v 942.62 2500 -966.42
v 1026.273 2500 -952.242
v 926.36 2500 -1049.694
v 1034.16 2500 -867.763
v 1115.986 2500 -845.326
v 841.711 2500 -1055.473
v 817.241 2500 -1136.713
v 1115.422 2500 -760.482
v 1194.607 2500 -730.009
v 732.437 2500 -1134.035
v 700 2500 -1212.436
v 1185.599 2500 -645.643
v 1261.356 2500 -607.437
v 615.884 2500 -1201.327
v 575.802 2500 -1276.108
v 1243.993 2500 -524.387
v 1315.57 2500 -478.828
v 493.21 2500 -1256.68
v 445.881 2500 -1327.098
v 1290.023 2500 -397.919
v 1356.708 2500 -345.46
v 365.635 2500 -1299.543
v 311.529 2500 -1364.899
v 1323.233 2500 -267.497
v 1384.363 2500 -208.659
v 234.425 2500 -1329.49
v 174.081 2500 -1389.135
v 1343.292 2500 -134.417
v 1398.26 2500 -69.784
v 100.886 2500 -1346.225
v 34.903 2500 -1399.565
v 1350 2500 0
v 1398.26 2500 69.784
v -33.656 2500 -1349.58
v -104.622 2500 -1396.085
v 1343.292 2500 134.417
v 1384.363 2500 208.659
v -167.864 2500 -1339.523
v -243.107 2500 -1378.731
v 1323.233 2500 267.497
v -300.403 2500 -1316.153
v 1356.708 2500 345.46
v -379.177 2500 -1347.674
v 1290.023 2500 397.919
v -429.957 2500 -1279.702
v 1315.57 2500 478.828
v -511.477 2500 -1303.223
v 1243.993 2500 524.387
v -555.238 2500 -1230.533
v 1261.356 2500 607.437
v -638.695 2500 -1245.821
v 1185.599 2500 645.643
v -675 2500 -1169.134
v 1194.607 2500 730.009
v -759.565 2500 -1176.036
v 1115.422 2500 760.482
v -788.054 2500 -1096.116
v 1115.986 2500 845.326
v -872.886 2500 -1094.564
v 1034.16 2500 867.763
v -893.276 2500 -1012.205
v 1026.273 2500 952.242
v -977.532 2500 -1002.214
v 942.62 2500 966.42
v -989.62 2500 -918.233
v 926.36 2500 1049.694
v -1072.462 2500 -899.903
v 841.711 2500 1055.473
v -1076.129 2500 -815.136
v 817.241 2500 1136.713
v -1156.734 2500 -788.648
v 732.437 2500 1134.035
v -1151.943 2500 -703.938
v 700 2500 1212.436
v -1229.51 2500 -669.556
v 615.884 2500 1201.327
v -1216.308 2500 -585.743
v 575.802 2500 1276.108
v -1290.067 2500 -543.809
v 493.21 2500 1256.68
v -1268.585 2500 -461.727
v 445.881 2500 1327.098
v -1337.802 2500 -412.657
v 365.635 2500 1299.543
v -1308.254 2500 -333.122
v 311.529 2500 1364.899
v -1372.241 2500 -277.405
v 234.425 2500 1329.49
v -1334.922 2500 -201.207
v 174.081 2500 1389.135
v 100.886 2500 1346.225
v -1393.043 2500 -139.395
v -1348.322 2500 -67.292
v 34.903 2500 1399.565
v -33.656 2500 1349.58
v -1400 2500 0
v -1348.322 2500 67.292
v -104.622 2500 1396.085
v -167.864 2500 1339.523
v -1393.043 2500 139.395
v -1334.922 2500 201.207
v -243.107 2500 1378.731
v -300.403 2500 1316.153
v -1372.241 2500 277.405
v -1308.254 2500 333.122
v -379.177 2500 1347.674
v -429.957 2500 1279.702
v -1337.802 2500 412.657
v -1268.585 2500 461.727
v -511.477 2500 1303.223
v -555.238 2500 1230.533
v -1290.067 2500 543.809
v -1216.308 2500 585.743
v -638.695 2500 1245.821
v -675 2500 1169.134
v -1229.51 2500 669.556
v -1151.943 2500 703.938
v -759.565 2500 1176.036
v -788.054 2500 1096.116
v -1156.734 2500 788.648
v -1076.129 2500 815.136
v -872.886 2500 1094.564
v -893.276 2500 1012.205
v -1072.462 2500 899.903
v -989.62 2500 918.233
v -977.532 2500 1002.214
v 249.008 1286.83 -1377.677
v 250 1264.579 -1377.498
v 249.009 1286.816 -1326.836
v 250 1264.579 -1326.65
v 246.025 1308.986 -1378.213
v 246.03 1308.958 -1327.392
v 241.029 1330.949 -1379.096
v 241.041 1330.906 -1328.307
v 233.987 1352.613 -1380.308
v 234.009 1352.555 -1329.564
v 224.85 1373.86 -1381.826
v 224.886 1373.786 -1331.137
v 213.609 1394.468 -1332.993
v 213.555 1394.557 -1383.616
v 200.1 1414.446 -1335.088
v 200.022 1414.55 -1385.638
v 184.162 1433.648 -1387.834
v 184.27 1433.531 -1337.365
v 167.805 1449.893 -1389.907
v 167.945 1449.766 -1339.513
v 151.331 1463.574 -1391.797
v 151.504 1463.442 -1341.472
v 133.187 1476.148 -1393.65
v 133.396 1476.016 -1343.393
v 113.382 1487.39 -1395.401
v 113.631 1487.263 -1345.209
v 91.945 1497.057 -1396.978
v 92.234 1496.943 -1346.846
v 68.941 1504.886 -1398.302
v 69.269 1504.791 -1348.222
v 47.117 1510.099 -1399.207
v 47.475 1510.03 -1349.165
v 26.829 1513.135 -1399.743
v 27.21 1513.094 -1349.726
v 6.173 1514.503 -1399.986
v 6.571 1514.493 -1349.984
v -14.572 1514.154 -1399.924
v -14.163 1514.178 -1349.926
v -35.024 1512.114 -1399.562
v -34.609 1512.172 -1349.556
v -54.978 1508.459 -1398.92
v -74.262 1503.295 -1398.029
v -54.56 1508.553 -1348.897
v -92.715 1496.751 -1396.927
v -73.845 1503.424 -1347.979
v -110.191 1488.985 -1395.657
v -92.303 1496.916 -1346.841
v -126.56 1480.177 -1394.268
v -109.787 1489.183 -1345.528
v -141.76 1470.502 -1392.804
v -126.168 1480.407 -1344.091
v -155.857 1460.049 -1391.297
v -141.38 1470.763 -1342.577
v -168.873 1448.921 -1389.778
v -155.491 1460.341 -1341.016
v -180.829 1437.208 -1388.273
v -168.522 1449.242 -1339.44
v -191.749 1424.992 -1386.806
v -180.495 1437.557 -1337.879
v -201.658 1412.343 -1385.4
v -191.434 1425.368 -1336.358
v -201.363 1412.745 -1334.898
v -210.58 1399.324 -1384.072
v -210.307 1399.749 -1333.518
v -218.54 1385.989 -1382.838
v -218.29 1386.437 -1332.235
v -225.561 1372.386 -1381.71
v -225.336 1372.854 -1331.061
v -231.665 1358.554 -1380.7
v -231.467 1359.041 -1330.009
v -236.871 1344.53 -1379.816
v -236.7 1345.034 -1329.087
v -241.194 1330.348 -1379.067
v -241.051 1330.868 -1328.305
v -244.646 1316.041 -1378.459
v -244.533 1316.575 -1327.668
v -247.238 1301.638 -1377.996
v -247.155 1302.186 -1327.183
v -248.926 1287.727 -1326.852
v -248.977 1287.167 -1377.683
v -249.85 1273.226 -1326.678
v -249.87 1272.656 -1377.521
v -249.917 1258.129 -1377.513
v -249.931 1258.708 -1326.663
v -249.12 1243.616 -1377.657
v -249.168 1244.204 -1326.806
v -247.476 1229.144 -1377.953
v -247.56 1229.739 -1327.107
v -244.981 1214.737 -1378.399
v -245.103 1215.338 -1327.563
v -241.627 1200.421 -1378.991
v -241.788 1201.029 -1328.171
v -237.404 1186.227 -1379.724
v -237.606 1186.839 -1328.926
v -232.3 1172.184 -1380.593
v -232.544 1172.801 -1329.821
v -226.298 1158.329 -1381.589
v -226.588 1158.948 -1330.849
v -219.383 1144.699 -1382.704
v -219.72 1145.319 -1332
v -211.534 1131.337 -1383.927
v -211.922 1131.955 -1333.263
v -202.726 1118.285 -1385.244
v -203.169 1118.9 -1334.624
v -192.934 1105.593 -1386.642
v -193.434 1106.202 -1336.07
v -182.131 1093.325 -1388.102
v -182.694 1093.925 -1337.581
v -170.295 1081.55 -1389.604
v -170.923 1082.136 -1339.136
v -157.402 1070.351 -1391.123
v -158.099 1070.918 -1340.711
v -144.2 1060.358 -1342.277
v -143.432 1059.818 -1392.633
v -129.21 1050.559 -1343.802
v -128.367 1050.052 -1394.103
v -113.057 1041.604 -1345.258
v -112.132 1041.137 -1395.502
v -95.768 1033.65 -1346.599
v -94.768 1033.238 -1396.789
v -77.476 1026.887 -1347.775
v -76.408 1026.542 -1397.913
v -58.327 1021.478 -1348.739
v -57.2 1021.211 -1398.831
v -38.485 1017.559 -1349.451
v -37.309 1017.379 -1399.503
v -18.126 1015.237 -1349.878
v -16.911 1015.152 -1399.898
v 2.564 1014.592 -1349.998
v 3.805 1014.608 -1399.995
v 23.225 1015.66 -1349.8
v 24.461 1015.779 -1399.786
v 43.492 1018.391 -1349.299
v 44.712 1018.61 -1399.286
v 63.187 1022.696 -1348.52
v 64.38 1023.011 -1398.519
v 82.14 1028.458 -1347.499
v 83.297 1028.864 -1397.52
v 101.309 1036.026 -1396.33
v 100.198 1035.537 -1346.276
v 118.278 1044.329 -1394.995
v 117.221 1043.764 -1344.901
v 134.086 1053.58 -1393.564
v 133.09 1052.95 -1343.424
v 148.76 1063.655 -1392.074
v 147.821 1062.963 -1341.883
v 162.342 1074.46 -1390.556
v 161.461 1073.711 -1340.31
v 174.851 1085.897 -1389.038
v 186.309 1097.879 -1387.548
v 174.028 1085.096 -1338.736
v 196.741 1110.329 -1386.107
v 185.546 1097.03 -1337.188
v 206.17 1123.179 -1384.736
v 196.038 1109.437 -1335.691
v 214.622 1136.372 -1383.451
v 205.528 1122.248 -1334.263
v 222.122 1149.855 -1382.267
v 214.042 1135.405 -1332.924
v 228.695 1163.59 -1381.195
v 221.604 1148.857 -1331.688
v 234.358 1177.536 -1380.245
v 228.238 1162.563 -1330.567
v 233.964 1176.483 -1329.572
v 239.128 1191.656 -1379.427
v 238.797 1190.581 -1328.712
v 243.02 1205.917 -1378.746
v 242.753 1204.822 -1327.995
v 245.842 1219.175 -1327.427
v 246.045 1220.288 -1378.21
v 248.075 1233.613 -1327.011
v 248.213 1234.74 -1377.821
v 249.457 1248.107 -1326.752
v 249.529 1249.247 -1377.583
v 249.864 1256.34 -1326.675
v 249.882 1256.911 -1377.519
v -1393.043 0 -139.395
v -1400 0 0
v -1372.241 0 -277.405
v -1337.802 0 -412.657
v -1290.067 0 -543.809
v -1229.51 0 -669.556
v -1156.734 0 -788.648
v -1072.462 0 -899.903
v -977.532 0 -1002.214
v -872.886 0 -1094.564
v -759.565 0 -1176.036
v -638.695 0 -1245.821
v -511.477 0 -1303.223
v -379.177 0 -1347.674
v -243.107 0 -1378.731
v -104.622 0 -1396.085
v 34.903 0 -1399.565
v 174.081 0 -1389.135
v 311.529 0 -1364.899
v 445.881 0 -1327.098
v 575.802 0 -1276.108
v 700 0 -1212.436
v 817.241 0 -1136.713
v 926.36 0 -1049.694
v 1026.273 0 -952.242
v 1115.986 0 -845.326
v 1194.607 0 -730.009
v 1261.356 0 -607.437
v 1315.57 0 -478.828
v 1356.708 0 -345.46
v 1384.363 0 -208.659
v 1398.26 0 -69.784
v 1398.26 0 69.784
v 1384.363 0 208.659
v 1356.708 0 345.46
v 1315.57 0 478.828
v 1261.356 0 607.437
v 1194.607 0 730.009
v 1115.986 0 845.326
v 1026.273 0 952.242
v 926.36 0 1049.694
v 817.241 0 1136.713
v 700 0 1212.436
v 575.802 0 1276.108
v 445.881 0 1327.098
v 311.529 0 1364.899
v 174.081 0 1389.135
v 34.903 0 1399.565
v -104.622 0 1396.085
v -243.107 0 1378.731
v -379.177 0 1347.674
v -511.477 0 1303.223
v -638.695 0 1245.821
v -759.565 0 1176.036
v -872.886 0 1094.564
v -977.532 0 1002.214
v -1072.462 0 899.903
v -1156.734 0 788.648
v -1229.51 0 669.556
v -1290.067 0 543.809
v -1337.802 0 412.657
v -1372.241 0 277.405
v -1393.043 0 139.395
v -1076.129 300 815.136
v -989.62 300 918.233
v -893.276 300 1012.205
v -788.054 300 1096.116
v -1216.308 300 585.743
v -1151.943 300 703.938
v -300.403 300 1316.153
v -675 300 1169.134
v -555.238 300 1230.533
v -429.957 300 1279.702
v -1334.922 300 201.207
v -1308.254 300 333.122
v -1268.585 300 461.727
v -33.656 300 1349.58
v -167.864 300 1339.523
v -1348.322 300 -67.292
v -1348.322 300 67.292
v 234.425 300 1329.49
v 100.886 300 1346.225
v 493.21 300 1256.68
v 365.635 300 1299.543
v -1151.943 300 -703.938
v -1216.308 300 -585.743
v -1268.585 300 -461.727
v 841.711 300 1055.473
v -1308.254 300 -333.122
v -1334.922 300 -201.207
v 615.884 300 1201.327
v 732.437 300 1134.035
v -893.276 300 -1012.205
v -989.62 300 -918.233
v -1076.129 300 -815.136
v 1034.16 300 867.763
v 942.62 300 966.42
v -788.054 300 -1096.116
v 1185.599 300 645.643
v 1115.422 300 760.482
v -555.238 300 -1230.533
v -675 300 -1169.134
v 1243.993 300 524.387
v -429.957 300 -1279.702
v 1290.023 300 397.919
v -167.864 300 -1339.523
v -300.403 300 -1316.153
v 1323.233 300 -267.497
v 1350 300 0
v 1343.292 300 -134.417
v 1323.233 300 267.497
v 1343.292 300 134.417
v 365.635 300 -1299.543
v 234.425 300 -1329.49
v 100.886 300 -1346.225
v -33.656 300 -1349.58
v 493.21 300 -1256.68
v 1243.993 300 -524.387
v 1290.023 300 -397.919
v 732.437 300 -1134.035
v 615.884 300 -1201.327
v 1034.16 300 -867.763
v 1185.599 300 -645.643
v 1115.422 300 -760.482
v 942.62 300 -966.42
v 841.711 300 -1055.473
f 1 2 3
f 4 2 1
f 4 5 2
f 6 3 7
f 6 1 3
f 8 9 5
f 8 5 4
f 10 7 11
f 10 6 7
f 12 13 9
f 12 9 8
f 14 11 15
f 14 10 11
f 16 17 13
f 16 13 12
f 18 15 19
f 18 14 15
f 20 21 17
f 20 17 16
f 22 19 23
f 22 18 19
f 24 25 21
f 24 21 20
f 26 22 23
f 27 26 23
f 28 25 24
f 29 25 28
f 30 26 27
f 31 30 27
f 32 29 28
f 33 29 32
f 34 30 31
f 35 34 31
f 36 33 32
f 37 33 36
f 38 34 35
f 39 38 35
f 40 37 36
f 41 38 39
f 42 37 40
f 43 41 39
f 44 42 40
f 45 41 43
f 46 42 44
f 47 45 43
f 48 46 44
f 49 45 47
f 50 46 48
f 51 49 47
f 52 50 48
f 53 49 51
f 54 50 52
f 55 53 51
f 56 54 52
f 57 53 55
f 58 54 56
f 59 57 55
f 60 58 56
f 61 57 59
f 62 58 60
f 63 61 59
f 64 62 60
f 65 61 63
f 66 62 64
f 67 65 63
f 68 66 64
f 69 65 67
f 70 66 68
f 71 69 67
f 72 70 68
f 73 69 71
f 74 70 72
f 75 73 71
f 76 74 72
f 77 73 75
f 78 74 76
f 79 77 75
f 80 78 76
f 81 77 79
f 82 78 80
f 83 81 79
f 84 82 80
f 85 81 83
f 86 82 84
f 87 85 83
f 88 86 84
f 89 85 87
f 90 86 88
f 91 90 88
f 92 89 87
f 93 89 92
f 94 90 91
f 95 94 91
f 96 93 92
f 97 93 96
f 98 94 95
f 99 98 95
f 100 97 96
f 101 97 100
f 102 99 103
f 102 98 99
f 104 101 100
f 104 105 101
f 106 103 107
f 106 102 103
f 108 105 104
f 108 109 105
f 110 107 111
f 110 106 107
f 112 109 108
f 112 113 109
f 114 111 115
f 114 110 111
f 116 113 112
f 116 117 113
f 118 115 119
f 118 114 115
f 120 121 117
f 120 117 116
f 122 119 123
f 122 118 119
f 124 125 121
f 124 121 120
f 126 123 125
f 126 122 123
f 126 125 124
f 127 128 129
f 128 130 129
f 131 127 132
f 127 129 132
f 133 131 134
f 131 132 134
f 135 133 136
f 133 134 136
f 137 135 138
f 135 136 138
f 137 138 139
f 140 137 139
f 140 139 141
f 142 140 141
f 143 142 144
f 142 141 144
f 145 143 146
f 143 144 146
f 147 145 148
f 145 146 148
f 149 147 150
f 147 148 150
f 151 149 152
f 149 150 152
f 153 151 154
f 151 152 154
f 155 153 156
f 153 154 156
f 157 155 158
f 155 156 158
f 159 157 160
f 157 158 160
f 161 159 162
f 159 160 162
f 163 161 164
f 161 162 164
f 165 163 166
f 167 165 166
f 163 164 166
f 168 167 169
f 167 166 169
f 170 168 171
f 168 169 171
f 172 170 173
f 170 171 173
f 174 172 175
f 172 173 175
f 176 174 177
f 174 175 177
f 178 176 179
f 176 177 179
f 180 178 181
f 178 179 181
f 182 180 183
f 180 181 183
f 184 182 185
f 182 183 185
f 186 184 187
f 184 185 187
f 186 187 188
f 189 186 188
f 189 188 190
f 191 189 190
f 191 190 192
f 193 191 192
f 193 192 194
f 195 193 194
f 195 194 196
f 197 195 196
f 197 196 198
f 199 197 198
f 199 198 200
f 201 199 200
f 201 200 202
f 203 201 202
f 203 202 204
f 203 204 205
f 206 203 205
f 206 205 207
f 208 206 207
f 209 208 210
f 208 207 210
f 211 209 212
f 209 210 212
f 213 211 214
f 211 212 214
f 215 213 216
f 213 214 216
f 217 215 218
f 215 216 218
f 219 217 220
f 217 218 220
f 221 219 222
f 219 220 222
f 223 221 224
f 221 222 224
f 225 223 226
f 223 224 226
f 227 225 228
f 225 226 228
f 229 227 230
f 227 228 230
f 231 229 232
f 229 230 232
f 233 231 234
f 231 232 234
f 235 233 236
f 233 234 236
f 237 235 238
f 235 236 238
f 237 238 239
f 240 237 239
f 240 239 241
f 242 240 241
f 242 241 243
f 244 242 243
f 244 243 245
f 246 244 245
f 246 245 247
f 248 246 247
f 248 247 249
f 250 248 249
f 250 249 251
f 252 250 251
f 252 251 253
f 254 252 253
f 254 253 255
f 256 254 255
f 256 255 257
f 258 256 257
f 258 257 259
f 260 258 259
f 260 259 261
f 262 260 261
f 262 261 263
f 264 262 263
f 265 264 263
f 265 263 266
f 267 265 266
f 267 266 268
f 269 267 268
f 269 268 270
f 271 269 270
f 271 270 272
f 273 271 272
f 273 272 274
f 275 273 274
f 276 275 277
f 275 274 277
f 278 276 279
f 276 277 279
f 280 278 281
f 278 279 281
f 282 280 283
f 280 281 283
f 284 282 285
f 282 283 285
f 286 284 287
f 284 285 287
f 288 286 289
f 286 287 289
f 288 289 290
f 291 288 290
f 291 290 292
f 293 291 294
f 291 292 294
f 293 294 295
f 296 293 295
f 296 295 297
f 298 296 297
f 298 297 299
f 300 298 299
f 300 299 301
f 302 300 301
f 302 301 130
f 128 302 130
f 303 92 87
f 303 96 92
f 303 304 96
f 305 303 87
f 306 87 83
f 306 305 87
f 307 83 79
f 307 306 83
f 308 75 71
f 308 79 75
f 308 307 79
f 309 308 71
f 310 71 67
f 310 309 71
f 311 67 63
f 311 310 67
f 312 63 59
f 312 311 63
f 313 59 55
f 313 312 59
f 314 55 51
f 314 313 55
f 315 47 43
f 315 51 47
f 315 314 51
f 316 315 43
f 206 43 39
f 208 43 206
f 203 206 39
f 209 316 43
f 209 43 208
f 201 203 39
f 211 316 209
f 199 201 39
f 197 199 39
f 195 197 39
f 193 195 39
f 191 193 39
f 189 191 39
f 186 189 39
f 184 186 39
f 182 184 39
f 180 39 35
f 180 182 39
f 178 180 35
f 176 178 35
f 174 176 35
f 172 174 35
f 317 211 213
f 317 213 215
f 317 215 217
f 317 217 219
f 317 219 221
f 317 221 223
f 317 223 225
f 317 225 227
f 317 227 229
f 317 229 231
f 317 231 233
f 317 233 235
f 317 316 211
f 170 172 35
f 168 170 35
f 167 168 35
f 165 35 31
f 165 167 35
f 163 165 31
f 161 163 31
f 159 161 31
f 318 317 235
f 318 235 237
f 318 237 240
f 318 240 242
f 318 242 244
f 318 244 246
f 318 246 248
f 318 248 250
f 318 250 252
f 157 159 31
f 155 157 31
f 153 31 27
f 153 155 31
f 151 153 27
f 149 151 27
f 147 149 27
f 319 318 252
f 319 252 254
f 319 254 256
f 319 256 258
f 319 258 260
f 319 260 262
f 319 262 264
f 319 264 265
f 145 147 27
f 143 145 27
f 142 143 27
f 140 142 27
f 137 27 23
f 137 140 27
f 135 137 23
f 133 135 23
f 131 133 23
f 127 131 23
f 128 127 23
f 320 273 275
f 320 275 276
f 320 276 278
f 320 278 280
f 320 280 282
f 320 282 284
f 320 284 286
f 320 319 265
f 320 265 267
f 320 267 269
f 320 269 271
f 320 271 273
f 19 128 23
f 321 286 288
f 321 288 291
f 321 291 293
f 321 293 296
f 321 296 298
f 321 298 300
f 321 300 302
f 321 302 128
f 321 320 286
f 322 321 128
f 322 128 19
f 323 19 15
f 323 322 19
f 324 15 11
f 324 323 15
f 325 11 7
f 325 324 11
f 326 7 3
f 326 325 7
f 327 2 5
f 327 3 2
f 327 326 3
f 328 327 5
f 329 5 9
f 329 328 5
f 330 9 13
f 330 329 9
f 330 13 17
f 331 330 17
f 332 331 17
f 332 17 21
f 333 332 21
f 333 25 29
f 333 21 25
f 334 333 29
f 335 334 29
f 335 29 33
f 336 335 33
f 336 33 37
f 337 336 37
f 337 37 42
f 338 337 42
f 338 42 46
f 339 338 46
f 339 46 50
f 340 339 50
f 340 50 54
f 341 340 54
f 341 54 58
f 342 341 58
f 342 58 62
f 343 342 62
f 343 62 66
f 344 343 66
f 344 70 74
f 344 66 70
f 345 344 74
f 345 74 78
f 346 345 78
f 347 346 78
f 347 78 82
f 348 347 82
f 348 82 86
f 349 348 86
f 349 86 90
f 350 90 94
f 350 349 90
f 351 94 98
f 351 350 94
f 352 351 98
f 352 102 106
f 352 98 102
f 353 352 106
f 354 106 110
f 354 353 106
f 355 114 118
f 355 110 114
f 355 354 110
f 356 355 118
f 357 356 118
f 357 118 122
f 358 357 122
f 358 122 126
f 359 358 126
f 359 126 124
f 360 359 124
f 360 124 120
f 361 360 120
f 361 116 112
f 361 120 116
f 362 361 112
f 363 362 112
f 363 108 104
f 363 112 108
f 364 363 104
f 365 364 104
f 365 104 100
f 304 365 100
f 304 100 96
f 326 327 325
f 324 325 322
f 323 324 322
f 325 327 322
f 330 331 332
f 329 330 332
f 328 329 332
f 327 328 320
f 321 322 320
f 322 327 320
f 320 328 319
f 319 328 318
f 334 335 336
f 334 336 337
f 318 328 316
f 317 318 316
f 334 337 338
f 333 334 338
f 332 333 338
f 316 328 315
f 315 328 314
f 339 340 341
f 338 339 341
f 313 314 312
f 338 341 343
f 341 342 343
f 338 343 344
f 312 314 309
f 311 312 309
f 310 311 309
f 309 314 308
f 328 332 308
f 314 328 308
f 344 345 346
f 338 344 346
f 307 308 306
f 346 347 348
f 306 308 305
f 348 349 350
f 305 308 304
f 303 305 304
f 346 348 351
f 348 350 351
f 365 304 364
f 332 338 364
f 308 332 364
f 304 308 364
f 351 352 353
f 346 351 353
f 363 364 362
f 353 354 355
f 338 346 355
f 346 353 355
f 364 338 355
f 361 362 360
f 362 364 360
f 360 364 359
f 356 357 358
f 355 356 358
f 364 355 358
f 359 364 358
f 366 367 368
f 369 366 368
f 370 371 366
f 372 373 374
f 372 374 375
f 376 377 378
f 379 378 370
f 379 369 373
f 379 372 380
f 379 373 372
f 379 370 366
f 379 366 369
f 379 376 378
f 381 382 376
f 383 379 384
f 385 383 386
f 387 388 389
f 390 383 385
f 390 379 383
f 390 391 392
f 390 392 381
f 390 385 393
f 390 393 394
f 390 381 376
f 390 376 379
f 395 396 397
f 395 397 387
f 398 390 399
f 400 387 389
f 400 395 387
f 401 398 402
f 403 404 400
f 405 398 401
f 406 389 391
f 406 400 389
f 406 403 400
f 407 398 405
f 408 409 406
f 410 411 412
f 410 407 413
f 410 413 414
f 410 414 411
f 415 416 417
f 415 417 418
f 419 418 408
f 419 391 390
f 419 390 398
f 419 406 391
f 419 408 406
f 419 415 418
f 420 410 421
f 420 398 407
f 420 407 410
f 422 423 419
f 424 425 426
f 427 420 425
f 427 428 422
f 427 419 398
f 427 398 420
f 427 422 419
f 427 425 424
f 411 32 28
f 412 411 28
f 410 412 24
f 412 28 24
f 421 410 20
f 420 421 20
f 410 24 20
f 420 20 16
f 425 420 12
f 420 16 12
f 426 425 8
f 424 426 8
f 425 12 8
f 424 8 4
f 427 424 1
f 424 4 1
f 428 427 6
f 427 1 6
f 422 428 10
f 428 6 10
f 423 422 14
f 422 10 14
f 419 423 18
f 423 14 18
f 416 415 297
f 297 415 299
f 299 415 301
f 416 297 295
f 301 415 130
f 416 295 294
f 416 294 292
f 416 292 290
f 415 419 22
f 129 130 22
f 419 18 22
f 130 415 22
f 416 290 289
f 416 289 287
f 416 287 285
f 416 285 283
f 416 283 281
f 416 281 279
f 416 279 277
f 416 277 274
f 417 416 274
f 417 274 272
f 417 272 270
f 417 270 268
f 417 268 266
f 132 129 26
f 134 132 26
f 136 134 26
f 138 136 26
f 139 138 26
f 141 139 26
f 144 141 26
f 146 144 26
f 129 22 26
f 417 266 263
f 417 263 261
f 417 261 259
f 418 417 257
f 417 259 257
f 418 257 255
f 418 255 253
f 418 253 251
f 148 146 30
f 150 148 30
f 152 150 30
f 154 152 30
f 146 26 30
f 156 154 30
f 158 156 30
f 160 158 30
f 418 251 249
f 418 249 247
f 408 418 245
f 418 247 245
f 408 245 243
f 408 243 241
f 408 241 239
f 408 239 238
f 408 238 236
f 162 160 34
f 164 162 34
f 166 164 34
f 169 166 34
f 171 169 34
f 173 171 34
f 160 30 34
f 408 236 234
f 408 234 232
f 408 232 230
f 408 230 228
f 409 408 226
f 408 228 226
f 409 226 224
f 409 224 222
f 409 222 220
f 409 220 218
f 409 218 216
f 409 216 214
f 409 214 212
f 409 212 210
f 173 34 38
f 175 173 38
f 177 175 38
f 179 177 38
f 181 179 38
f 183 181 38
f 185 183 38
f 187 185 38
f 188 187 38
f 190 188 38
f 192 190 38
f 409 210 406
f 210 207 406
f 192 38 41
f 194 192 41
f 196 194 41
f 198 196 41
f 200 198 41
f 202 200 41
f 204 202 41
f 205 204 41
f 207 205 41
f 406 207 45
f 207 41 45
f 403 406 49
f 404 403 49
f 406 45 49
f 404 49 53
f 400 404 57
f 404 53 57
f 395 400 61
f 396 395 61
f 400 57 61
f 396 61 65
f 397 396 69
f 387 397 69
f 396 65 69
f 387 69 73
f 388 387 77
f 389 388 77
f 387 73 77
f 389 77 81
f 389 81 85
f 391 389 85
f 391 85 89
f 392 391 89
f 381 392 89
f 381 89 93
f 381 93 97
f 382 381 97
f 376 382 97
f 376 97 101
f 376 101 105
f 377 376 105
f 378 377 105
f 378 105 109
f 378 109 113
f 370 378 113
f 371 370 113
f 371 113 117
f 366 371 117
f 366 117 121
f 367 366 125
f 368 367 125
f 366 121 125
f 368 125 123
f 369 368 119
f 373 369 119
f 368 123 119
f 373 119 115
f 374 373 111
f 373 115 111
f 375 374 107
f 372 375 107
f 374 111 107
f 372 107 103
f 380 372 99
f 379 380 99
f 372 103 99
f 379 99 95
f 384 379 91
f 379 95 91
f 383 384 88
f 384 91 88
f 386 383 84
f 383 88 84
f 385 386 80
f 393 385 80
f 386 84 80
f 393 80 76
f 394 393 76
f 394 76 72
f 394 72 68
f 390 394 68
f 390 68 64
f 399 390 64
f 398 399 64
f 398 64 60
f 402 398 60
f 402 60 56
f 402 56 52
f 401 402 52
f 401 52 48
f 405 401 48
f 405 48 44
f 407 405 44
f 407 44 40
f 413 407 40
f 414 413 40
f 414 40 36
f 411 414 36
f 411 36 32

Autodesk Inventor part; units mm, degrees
ref_plane "YZ Plane" through (0, 0, 0) normal (1, 0, 0) x (0, 1, 0)
ref_plane "XZ Plane" through (0, 0, 0) normal (0, 1, 0) x (-1, 0, 0)
ref_plane "XY Plane" through (0, 0, 0) normal (0, 0, 1) x (1, 0, 0)
sketch "Sketch1" plane through (0, 0, 0) normal (0, 1, 0) x (-1, 0, 0)
  circle A0 centre (0, 0) radius 1400
  dimension "d0" = 2800
extrude "Extrusion1" add sketch "Sketch1" along normal blind 2500
sketch "Sketch2" plane through (0, 0, 0) normal (0, 0, 1) x (1, 0, 0)
  circle A0 centre (0, 1264.5792) radius 250
  point P0 (0, 0)
  dimension "d3" = 500
extrude "Extrusion2" cut sketch "Sketch2" against normal blind 4000
sketch "Sketch3" plane through (0, 2500, 0) normal (0, 1, 0) x (1, 0, 0)
  circle A0 centre (0, 0) radius 1350
  dimension "d6" = 2700
extrude "Extrusion3" cut sketch "Sketch3" against normal blind 2200
properties material "Silver"
